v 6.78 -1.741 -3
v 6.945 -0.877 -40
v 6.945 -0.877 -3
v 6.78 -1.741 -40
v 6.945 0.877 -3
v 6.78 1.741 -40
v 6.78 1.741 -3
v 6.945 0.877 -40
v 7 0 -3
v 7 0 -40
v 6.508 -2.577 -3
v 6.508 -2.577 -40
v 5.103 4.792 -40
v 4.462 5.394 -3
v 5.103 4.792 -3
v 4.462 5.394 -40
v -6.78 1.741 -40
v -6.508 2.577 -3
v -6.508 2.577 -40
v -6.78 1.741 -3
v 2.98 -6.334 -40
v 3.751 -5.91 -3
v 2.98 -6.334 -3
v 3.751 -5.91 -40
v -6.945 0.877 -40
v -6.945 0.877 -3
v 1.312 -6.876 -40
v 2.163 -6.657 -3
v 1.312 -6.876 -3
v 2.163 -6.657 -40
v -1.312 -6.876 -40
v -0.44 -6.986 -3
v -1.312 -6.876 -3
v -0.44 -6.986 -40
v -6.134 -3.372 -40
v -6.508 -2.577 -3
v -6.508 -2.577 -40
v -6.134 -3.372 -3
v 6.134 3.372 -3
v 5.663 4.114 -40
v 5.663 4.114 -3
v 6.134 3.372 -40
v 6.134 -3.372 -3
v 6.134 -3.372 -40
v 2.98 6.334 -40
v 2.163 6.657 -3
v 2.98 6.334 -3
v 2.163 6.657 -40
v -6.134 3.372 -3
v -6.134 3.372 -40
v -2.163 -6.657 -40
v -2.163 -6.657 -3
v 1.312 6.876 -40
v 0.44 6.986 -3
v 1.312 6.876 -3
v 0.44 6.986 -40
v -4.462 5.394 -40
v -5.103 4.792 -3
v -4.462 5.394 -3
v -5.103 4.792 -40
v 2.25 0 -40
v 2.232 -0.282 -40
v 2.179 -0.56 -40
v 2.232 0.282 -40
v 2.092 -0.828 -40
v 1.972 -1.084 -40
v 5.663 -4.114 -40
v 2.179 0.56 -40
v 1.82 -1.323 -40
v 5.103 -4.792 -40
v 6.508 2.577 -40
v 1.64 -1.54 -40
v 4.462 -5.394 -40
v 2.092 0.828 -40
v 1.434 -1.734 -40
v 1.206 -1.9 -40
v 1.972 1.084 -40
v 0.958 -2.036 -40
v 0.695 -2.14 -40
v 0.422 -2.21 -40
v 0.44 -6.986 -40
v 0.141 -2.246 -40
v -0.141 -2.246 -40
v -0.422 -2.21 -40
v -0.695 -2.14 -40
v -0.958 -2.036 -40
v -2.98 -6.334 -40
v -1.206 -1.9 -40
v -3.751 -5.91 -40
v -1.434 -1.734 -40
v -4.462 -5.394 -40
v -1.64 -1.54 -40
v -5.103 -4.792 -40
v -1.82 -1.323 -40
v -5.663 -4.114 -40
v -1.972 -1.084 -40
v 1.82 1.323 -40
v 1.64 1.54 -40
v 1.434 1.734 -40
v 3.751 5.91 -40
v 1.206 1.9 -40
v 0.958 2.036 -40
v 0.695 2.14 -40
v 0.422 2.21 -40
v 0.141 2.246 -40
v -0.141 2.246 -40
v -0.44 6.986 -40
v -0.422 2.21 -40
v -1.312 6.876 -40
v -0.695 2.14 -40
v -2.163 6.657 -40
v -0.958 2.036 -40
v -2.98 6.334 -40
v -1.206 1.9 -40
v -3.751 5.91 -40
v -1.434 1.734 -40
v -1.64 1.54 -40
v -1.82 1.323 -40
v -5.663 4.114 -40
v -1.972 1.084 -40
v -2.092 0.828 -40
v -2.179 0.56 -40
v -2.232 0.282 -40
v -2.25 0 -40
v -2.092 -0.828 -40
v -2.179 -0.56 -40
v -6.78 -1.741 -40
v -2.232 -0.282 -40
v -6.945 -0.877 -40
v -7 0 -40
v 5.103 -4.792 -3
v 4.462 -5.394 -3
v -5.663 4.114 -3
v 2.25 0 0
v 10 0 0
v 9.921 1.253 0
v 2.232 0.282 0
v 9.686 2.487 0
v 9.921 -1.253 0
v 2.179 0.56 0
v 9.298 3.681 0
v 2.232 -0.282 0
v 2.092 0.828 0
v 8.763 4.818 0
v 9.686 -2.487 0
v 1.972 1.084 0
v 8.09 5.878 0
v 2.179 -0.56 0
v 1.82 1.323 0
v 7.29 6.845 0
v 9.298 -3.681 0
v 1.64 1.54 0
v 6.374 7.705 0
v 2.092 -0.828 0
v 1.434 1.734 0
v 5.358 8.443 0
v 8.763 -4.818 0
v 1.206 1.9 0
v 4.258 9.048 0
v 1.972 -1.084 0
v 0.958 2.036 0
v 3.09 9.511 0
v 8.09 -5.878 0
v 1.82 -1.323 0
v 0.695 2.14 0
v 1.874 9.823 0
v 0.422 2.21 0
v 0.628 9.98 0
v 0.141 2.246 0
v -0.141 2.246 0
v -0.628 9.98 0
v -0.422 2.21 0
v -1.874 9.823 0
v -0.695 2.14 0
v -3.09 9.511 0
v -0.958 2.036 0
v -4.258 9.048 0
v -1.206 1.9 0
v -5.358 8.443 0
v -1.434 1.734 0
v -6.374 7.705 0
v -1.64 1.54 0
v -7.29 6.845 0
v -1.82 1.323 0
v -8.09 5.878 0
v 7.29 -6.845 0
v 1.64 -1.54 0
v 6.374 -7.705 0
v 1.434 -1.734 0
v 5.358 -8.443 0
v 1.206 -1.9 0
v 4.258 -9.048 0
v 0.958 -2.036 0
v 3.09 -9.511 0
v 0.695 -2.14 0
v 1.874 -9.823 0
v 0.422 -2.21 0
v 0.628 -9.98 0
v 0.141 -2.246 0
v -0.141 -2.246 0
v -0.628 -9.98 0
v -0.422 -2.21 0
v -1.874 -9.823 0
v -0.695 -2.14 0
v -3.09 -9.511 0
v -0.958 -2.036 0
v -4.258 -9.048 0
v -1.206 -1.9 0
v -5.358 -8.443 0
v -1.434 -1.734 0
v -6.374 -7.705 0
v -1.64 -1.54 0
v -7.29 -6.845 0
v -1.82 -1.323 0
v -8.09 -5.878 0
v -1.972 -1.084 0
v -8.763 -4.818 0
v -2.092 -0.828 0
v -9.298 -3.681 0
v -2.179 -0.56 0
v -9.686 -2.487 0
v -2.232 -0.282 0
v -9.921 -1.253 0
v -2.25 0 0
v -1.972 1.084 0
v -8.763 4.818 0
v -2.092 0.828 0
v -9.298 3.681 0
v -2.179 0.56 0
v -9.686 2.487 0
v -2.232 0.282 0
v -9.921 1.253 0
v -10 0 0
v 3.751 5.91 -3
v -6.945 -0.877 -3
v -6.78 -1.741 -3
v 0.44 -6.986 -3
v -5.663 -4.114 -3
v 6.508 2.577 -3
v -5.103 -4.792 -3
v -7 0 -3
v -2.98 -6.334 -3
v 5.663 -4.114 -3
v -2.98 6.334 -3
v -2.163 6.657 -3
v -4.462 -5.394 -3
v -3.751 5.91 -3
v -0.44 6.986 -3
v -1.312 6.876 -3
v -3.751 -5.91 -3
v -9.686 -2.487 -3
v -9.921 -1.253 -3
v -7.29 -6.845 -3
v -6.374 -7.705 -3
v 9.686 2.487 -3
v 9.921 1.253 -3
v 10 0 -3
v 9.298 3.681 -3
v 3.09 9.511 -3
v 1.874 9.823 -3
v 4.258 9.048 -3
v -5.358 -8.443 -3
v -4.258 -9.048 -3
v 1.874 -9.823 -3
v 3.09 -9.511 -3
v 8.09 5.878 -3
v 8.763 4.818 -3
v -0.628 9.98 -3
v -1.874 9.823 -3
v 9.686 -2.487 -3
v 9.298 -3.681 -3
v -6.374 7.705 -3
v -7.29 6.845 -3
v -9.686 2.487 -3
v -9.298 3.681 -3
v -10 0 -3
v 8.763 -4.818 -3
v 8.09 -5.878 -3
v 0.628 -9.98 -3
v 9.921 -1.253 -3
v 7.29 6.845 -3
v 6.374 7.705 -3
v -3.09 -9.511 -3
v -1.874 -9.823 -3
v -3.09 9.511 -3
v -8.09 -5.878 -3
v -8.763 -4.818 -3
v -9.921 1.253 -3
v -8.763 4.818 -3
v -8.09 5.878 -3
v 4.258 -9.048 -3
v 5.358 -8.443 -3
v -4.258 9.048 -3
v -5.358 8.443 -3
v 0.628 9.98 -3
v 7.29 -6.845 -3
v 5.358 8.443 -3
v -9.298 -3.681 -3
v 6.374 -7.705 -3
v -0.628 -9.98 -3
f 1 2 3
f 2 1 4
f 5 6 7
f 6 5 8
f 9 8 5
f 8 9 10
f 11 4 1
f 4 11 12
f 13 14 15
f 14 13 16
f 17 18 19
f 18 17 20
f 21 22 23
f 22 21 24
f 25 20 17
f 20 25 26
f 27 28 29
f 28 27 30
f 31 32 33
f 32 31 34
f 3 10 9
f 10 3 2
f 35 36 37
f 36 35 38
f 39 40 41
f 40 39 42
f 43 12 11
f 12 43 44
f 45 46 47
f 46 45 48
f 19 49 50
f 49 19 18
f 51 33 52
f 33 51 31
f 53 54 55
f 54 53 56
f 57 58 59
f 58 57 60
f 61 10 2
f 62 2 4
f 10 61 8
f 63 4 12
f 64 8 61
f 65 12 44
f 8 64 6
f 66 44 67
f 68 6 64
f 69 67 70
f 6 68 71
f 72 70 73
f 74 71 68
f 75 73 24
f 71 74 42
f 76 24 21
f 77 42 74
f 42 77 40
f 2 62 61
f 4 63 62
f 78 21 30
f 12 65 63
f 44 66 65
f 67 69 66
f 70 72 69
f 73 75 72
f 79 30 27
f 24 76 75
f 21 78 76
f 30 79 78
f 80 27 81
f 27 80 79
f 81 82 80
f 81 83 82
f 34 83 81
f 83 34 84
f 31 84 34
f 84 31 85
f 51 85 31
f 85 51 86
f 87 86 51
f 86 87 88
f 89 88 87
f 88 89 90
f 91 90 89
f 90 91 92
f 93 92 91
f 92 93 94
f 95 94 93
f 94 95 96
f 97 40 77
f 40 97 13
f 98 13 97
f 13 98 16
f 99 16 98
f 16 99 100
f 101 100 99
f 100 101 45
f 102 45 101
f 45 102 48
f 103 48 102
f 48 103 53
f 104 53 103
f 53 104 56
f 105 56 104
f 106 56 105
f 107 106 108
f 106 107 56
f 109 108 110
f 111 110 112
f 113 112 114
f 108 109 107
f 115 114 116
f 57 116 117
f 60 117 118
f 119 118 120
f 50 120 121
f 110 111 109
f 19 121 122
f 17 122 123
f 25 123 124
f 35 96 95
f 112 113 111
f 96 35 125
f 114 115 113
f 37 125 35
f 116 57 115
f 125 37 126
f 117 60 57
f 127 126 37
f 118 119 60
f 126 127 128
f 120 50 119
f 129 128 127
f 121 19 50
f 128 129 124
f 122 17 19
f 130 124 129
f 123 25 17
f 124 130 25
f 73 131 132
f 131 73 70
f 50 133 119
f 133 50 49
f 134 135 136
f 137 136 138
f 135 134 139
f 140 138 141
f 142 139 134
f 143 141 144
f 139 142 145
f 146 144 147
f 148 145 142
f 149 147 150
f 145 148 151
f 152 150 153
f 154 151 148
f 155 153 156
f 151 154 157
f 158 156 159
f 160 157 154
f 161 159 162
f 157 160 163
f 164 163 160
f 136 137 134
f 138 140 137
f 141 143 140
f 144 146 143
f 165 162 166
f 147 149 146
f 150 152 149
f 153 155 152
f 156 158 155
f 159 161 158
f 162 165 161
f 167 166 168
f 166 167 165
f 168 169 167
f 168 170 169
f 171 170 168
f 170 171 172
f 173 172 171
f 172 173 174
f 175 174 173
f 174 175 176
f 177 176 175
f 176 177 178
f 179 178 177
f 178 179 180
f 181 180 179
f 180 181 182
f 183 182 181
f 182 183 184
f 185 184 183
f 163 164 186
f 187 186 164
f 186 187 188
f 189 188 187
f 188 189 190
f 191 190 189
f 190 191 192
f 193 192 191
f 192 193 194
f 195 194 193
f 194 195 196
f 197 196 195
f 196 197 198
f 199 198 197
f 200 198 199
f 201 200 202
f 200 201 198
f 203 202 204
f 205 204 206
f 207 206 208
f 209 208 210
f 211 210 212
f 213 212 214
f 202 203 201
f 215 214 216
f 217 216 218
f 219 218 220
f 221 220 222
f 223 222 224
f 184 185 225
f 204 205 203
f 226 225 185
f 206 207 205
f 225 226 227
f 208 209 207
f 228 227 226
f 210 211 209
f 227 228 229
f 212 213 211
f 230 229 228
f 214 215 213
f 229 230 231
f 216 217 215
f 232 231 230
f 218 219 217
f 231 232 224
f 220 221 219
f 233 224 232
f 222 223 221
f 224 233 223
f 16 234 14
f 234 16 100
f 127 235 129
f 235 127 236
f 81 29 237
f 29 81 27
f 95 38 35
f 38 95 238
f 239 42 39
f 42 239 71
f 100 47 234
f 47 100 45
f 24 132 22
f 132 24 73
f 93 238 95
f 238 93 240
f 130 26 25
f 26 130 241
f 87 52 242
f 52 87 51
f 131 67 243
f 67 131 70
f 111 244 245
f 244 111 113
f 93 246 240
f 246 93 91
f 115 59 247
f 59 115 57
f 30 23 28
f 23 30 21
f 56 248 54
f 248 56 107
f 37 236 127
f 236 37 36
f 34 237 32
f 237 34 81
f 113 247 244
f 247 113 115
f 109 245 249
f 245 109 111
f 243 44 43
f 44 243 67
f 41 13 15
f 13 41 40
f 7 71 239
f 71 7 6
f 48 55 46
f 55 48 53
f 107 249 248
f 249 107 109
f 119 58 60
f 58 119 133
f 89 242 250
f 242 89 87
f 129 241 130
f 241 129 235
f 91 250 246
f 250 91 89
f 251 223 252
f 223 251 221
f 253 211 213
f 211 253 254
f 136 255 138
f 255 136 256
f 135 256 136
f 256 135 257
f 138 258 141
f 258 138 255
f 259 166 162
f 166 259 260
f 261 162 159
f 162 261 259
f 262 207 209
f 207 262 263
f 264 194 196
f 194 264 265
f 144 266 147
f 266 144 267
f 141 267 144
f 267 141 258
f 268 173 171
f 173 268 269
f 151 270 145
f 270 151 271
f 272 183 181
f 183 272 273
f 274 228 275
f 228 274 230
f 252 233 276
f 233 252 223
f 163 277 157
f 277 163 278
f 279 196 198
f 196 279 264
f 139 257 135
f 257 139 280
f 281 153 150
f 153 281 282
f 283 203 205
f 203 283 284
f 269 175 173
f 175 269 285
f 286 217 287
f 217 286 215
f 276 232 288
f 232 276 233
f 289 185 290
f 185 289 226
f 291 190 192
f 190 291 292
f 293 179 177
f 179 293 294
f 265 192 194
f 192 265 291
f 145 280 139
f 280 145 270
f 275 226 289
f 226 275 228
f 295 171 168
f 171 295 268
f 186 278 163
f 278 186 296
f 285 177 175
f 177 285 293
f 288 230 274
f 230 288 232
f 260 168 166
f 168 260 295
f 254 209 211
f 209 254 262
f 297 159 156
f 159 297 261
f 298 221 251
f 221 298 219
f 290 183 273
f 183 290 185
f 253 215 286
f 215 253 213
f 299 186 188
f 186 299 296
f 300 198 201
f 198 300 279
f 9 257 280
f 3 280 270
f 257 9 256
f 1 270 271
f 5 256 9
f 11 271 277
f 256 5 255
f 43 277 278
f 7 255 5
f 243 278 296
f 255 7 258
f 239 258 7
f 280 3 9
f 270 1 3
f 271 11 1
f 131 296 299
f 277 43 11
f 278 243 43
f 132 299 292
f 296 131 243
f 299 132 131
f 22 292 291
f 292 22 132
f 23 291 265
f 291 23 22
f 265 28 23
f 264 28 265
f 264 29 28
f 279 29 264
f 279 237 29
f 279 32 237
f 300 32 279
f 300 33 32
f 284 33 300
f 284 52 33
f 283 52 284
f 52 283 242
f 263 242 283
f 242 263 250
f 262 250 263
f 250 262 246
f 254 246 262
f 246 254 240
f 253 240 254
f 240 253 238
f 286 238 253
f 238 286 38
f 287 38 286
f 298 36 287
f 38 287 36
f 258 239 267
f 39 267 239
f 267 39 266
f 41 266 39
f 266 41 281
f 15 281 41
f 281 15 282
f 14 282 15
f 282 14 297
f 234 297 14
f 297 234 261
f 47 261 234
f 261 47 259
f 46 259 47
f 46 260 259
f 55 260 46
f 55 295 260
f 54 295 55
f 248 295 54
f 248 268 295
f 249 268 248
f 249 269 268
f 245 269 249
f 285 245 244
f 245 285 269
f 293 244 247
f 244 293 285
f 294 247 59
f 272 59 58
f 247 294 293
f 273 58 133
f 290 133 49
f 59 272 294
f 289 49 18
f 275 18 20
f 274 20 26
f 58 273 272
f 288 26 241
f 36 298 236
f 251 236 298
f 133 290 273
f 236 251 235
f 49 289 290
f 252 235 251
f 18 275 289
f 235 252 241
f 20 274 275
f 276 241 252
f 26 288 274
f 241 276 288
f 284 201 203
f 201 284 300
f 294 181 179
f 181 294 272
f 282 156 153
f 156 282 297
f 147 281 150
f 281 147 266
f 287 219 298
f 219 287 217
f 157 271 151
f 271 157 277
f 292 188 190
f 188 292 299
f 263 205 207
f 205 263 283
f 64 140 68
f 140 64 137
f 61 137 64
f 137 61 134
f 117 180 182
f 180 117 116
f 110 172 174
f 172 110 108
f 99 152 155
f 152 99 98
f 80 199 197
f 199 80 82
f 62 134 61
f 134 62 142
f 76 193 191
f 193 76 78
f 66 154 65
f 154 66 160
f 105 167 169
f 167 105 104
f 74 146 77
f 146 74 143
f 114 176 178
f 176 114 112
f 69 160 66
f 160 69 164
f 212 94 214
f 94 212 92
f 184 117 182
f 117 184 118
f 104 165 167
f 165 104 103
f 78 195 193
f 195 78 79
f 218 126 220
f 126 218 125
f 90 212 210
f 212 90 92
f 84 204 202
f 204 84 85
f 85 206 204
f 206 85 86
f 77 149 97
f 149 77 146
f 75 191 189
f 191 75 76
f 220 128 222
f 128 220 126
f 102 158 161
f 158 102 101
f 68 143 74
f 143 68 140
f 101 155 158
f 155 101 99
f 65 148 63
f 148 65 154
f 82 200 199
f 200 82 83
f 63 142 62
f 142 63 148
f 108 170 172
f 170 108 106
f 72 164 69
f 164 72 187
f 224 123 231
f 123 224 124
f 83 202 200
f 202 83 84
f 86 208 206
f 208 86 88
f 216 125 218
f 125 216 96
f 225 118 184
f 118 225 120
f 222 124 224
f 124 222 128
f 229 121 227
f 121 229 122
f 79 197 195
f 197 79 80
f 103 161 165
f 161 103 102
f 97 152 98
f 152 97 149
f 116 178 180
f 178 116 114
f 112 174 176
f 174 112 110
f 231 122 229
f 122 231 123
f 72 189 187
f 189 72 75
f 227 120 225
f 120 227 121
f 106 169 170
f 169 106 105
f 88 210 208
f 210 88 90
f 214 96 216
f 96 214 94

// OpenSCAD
$fn = 50;


difference() {
	union() {
		translate(v = [0, 0, -40.0000000000]) {
			cylinder(h = 40, r = 7.0000000000);
		}
		translate(v = [0, 0, -3.0000000000]) {
			cylinder(h = 3, r = 10.0000000000);
		}
	}
	union() {
		#translate(v = [0, 0, -40]) {
			cylinder(h = 40, r = 2.2500000000);
		}
	}
}
